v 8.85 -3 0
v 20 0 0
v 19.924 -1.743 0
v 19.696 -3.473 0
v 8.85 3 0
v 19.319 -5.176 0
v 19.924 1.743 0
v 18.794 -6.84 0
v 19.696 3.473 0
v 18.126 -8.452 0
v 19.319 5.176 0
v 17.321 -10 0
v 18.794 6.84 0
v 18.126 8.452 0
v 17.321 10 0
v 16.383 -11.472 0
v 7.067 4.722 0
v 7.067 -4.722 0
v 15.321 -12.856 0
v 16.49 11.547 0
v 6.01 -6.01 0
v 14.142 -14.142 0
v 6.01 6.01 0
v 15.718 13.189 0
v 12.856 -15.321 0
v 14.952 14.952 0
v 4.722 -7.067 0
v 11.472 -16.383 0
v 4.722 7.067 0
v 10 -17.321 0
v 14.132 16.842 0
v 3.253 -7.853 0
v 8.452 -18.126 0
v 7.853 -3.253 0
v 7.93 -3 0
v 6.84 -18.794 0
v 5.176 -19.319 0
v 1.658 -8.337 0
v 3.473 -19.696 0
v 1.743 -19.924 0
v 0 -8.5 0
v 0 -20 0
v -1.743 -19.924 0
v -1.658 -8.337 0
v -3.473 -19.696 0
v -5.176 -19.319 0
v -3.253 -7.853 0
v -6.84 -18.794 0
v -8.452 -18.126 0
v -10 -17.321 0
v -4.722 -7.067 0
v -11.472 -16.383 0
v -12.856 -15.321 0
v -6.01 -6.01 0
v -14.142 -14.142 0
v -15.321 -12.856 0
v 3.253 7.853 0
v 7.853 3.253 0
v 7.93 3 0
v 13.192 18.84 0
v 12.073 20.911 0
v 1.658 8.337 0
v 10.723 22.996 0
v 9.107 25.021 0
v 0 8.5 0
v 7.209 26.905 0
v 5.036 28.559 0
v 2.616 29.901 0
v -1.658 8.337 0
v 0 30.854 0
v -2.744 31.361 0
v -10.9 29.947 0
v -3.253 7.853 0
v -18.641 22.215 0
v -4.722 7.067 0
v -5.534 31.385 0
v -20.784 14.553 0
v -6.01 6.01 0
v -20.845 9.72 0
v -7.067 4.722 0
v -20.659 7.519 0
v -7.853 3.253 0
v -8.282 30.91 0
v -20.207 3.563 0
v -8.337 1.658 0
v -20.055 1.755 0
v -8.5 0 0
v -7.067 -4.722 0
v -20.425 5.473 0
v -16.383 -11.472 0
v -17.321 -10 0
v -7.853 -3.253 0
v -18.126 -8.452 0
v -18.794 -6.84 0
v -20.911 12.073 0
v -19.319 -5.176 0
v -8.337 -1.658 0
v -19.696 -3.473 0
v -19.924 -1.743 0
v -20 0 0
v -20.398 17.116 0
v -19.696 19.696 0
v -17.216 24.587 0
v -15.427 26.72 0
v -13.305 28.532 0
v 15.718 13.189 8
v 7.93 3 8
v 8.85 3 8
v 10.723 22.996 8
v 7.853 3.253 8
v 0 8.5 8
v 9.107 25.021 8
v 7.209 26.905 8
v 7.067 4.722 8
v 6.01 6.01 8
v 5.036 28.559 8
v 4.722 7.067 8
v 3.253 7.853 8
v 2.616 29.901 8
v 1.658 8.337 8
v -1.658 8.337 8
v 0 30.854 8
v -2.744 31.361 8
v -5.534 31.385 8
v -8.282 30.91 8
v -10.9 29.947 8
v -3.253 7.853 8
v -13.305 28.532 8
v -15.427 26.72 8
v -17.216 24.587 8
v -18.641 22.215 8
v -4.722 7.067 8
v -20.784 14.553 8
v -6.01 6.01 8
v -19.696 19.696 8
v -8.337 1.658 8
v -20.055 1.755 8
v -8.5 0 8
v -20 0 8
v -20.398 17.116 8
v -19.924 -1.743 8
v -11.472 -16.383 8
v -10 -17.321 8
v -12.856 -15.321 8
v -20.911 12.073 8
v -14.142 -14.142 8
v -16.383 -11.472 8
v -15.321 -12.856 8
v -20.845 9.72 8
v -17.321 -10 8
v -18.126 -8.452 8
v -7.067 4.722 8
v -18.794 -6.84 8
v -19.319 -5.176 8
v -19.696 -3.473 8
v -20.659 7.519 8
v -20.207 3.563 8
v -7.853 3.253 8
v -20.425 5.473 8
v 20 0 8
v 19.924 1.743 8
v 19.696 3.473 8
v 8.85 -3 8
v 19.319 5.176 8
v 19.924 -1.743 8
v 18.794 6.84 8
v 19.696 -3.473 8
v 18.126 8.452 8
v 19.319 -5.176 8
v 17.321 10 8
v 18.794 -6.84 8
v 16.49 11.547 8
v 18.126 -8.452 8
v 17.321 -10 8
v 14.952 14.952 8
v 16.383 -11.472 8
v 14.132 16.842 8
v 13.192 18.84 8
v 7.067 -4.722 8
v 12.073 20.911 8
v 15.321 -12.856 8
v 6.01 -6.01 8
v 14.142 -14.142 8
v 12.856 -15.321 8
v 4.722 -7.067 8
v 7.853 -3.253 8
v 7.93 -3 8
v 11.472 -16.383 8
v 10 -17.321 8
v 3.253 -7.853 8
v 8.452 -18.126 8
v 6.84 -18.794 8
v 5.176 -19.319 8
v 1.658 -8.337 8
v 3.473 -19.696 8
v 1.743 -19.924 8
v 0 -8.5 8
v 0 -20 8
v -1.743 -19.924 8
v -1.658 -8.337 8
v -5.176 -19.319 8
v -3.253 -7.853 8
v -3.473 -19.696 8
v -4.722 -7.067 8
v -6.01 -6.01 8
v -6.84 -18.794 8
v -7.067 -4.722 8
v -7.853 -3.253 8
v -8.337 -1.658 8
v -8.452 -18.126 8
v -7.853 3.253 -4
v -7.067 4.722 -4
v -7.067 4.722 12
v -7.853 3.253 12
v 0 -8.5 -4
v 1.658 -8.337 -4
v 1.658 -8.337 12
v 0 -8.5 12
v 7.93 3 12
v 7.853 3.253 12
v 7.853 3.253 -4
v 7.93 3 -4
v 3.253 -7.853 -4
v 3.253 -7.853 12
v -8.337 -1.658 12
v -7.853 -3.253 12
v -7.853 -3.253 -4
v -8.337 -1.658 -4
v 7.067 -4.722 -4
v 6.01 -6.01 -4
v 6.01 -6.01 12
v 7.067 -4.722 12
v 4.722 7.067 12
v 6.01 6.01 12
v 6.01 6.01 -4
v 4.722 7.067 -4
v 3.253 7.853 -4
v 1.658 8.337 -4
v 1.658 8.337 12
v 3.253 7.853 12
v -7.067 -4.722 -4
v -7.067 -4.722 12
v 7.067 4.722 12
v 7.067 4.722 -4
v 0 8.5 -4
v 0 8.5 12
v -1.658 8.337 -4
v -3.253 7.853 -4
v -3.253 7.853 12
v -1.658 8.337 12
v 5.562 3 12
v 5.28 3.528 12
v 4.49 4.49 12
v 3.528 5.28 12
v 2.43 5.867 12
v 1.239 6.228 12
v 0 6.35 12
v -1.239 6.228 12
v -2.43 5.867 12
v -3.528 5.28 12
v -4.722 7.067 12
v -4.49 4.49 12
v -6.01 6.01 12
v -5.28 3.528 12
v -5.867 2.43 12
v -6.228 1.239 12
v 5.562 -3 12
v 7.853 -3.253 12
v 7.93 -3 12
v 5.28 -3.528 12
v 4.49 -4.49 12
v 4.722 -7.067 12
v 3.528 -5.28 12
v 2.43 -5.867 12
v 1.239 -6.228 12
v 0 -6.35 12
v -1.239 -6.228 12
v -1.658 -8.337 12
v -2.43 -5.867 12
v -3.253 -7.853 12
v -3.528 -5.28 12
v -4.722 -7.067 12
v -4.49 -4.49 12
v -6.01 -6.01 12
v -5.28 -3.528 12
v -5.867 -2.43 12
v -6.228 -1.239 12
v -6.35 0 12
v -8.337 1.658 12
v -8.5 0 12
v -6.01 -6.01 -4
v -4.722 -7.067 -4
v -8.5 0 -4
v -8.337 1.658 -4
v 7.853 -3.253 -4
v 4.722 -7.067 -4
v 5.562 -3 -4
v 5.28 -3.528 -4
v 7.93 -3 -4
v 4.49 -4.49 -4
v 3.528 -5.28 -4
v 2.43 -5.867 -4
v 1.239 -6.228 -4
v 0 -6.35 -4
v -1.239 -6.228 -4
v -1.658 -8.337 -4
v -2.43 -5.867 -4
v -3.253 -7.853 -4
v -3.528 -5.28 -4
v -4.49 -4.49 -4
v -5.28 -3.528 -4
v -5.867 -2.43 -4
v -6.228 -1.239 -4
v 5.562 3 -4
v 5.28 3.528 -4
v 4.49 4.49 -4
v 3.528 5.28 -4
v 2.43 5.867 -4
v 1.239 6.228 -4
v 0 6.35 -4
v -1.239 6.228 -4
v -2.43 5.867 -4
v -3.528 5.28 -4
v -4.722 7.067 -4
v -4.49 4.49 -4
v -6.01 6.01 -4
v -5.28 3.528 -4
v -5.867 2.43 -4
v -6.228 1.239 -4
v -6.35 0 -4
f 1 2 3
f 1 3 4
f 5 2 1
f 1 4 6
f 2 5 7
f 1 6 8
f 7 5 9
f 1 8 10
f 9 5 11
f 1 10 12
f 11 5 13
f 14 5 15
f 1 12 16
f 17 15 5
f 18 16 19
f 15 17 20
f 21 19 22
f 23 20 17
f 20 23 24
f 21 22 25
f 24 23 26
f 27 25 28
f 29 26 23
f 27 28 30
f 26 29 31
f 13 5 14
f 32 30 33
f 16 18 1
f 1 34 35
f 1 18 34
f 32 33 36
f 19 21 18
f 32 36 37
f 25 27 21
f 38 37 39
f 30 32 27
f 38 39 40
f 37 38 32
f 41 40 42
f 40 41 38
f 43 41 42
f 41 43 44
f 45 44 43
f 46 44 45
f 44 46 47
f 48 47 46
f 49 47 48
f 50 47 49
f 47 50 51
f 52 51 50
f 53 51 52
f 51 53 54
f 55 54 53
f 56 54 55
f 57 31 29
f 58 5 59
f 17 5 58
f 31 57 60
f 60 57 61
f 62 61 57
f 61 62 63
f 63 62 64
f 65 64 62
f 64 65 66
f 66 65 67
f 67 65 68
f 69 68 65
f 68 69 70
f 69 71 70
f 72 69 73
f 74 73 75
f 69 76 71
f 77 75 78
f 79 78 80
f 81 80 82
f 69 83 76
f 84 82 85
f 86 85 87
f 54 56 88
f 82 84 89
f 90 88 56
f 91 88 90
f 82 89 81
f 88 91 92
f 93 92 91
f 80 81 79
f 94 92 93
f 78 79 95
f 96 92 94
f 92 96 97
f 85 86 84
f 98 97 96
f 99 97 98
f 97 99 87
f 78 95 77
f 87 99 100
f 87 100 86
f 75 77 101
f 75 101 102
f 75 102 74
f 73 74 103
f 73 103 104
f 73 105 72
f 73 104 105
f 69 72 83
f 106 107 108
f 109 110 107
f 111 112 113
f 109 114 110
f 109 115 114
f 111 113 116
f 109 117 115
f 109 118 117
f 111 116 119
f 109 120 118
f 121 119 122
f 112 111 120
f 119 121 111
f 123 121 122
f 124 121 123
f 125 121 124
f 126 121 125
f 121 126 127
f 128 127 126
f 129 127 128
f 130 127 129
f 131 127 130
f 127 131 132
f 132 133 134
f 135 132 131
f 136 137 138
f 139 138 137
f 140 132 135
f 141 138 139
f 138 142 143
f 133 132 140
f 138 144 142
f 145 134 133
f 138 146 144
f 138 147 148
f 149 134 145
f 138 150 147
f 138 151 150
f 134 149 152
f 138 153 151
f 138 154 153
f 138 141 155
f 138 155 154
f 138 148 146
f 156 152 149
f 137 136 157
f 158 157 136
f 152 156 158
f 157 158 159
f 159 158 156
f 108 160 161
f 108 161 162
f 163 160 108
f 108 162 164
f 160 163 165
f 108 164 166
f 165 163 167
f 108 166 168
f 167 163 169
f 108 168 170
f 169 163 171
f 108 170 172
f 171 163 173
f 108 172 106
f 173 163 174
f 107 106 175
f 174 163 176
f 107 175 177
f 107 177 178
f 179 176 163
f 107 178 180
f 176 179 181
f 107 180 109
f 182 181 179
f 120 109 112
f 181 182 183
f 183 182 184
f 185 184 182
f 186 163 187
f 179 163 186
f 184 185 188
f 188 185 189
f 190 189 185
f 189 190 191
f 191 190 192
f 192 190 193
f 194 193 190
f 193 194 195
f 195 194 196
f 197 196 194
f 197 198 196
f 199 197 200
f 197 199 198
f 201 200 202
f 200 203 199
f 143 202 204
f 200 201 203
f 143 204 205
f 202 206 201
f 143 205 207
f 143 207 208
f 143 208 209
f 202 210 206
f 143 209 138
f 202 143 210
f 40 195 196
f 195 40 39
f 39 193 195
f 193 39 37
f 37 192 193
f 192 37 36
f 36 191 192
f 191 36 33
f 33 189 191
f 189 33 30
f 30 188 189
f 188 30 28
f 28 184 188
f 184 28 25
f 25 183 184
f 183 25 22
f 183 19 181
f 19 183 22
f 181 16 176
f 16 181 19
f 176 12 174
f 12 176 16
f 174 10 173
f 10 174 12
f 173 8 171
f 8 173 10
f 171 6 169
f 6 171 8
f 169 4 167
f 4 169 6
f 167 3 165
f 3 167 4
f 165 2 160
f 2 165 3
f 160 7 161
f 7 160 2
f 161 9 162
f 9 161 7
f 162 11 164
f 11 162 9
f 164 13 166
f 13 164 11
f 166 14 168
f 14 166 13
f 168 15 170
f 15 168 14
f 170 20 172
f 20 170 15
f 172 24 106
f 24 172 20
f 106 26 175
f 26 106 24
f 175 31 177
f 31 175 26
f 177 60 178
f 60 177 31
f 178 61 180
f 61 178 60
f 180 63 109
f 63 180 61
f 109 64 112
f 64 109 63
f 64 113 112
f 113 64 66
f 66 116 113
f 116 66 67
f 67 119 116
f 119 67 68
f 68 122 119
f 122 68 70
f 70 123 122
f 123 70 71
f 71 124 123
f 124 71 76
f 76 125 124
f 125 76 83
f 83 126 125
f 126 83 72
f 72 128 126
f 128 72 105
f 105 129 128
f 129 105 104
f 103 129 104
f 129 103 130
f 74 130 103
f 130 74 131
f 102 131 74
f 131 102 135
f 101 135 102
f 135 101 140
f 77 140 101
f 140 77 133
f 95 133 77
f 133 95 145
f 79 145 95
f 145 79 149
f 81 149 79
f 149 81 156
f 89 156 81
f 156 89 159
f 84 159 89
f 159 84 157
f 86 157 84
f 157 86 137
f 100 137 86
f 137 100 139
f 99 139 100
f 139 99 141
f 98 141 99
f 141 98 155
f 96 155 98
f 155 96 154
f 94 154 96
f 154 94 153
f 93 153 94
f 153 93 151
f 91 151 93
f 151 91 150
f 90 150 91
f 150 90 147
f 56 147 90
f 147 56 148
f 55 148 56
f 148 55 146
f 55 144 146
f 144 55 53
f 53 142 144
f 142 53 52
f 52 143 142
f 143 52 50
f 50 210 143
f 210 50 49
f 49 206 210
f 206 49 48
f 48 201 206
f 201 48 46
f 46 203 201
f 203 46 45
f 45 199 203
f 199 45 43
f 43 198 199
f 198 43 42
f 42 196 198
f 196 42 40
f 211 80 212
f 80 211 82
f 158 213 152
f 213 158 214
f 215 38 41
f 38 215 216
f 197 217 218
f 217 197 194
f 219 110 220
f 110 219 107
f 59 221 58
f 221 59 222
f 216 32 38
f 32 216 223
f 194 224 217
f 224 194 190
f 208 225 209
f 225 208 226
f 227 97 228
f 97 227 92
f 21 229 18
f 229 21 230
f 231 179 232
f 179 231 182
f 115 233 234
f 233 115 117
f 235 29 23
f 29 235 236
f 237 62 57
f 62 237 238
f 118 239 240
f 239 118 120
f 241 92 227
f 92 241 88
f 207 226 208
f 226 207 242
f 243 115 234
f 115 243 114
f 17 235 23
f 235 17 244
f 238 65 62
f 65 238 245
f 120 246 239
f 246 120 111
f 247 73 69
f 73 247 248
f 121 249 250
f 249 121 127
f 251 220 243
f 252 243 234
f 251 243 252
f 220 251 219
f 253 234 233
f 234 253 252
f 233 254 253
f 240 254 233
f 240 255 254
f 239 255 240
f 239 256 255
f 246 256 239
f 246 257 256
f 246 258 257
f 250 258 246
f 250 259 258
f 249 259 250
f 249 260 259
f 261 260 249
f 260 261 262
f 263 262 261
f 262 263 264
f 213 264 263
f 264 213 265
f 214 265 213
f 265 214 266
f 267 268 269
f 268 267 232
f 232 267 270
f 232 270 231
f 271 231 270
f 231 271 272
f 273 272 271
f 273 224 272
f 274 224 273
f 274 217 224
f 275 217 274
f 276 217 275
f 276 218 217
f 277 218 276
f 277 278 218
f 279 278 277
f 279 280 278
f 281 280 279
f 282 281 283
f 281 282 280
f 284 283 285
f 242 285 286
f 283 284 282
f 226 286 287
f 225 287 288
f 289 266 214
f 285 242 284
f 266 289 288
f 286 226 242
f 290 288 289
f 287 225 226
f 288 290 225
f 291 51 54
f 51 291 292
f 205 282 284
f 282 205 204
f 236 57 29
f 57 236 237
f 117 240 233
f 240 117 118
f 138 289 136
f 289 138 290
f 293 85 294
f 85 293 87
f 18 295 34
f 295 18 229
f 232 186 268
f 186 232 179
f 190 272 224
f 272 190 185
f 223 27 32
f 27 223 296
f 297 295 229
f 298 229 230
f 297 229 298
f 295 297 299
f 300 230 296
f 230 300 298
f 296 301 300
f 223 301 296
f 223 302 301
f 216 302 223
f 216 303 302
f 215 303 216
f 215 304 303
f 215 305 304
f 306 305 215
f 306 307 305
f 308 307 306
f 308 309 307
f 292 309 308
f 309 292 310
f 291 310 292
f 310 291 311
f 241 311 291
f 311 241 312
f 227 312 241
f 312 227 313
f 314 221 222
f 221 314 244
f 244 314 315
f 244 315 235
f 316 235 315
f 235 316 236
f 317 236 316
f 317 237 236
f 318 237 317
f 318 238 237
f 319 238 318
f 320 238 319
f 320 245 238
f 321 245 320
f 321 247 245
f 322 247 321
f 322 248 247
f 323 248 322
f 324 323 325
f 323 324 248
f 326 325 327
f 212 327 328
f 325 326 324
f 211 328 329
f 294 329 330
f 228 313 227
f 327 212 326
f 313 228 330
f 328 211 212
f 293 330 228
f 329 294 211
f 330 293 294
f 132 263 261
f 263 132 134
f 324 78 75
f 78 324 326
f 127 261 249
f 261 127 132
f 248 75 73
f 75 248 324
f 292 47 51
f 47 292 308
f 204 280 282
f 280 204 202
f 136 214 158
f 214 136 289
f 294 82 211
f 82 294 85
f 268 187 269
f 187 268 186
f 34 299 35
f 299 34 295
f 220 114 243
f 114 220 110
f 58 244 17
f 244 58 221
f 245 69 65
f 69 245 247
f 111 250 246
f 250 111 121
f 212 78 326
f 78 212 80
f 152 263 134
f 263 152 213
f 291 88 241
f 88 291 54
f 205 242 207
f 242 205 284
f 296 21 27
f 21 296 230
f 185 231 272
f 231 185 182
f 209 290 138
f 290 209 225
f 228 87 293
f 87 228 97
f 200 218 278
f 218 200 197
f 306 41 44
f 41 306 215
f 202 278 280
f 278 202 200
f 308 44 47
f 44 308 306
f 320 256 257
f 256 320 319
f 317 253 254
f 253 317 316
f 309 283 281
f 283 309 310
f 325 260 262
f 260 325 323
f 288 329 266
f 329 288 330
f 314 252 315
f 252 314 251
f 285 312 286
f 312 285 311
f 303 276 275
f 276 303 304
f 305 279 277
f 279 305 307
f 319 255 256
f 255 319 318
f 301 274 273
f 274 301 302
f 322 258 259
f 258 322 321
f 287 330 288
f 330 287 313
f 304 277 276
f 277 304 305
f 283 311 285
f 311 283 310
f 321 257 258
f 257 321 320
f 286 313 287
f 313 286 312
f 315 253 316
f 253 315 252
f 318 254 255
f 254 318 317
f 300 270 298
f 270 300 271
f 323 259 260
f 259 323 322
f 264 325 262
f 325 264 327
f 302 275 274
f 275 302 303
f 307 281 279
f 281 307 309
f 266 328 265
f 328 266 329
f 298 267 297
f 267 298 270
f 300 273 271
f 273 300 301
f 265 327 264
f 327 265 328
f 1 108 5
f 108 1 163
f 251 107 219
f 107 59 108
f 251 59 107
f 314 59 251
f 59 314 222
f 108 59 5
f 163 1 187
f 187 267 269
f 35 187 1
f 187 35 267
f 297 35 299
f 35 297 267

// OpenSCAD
$fn = 32;

// ----------------------------------------------------------------------
// Cam: base radius 20 mm with a 12 mm lift over 150 degrees
// ----------------------------------------------------------------------

// --- parameters (mm) ---
base_r = 20;              // base radius
lift = 12;                // lift height above the base radius
lift_span = 150;          // angular width of the lift
lift_start = 30;          // angle where the lift starts
cam_t = 8;                // cam plate thickness
hub_d = 17;               // hub diameter
hub_h = 16;               // hub height
bore_d = 12.7;            // bore
key_w = 6;                // keyway width
key_depth = 1.6;          // keyway depth

cam_profile = [[20, 0], [19.924, 1.743], [19.696, 3.473], [19.319, 5.176], [18.794, 6.84], [18.126, 8.452], [17.321, 10], [16.49, 11.547], [15.718, 13.189], [14.952, 14.952], [14.132, 16.842], [13.192, 18.84], [12.073, 20.911], [10.723, 22.996], [9.107, 25.021], [7.209, 26.905], [5.036, 28.559], [2.616, 29.901], [0, 30.854], [-2.744, 31.361], [-5.534, 31.385], [-8.282, 30.91], [-10.9, 29.947], [-13.305, 28.532], [-15.427, 26.72], [-17.216, 24.587], [-18.641, 22.215], [-19.696, 19.696], [-20.398, 17.116], [-20.784, 14.553], [-20.911, 12.073], [-20.845, 9.72], [-20.659, 7.519], [-20.425, 5.473], [-20.207, 3.563], [-20.055, 1.755], [-20, 0], [-19.924, -1.743], [-19.696, -3.473], [-19.319, -5.176], [-18.794, -6.84], [-18.126, -8.452], [-17.321, -10], [-16.383, -11.472], [-15.321, -12.856], [-14.142, -14.142], [-12.856, -15.321], [-11.472, -16.383], [-10, -17.321], [-8.452, -18.126], [-6.84, -18.794], [-5.176, -19.319], [-3.473, -19.696], [-1.743, -19.924], [0, -20], [1.743, -19.924], [3.473, -19.696], [5.176, -19.319], [6.84, -18.794], [8.452, -18.126], [10, -17.321], [11.472, -16.383], [12.856, -15.321], [14.142, -14.142], [15.321, -12.856], [16.383, -11.472], [17.321, -10], [18.126, -8.452], [18.794, -6.84], [19.319, -5.176], [19.696, -3.473], [19.924, -1.743]];

difference() {
  union() {
    linear_extrude(height = cam_t) polygon(cam_profile);
    /* hub, proud of the cam plate on both sides */
    translate([0, 0, -4]) cylinder(h = hub_h, d = hub_d);
  }
  /* bore through the hub, 2.5 mm clear on both faces */
  translate([0, 0, -6.5]) cylinder(h = hub_h + 5, d = bore_d);
  /* keyway, milled through the whole hub */
  translate([4.75, -3, -6.5]) cube([4.1, 6, 21]);
}
